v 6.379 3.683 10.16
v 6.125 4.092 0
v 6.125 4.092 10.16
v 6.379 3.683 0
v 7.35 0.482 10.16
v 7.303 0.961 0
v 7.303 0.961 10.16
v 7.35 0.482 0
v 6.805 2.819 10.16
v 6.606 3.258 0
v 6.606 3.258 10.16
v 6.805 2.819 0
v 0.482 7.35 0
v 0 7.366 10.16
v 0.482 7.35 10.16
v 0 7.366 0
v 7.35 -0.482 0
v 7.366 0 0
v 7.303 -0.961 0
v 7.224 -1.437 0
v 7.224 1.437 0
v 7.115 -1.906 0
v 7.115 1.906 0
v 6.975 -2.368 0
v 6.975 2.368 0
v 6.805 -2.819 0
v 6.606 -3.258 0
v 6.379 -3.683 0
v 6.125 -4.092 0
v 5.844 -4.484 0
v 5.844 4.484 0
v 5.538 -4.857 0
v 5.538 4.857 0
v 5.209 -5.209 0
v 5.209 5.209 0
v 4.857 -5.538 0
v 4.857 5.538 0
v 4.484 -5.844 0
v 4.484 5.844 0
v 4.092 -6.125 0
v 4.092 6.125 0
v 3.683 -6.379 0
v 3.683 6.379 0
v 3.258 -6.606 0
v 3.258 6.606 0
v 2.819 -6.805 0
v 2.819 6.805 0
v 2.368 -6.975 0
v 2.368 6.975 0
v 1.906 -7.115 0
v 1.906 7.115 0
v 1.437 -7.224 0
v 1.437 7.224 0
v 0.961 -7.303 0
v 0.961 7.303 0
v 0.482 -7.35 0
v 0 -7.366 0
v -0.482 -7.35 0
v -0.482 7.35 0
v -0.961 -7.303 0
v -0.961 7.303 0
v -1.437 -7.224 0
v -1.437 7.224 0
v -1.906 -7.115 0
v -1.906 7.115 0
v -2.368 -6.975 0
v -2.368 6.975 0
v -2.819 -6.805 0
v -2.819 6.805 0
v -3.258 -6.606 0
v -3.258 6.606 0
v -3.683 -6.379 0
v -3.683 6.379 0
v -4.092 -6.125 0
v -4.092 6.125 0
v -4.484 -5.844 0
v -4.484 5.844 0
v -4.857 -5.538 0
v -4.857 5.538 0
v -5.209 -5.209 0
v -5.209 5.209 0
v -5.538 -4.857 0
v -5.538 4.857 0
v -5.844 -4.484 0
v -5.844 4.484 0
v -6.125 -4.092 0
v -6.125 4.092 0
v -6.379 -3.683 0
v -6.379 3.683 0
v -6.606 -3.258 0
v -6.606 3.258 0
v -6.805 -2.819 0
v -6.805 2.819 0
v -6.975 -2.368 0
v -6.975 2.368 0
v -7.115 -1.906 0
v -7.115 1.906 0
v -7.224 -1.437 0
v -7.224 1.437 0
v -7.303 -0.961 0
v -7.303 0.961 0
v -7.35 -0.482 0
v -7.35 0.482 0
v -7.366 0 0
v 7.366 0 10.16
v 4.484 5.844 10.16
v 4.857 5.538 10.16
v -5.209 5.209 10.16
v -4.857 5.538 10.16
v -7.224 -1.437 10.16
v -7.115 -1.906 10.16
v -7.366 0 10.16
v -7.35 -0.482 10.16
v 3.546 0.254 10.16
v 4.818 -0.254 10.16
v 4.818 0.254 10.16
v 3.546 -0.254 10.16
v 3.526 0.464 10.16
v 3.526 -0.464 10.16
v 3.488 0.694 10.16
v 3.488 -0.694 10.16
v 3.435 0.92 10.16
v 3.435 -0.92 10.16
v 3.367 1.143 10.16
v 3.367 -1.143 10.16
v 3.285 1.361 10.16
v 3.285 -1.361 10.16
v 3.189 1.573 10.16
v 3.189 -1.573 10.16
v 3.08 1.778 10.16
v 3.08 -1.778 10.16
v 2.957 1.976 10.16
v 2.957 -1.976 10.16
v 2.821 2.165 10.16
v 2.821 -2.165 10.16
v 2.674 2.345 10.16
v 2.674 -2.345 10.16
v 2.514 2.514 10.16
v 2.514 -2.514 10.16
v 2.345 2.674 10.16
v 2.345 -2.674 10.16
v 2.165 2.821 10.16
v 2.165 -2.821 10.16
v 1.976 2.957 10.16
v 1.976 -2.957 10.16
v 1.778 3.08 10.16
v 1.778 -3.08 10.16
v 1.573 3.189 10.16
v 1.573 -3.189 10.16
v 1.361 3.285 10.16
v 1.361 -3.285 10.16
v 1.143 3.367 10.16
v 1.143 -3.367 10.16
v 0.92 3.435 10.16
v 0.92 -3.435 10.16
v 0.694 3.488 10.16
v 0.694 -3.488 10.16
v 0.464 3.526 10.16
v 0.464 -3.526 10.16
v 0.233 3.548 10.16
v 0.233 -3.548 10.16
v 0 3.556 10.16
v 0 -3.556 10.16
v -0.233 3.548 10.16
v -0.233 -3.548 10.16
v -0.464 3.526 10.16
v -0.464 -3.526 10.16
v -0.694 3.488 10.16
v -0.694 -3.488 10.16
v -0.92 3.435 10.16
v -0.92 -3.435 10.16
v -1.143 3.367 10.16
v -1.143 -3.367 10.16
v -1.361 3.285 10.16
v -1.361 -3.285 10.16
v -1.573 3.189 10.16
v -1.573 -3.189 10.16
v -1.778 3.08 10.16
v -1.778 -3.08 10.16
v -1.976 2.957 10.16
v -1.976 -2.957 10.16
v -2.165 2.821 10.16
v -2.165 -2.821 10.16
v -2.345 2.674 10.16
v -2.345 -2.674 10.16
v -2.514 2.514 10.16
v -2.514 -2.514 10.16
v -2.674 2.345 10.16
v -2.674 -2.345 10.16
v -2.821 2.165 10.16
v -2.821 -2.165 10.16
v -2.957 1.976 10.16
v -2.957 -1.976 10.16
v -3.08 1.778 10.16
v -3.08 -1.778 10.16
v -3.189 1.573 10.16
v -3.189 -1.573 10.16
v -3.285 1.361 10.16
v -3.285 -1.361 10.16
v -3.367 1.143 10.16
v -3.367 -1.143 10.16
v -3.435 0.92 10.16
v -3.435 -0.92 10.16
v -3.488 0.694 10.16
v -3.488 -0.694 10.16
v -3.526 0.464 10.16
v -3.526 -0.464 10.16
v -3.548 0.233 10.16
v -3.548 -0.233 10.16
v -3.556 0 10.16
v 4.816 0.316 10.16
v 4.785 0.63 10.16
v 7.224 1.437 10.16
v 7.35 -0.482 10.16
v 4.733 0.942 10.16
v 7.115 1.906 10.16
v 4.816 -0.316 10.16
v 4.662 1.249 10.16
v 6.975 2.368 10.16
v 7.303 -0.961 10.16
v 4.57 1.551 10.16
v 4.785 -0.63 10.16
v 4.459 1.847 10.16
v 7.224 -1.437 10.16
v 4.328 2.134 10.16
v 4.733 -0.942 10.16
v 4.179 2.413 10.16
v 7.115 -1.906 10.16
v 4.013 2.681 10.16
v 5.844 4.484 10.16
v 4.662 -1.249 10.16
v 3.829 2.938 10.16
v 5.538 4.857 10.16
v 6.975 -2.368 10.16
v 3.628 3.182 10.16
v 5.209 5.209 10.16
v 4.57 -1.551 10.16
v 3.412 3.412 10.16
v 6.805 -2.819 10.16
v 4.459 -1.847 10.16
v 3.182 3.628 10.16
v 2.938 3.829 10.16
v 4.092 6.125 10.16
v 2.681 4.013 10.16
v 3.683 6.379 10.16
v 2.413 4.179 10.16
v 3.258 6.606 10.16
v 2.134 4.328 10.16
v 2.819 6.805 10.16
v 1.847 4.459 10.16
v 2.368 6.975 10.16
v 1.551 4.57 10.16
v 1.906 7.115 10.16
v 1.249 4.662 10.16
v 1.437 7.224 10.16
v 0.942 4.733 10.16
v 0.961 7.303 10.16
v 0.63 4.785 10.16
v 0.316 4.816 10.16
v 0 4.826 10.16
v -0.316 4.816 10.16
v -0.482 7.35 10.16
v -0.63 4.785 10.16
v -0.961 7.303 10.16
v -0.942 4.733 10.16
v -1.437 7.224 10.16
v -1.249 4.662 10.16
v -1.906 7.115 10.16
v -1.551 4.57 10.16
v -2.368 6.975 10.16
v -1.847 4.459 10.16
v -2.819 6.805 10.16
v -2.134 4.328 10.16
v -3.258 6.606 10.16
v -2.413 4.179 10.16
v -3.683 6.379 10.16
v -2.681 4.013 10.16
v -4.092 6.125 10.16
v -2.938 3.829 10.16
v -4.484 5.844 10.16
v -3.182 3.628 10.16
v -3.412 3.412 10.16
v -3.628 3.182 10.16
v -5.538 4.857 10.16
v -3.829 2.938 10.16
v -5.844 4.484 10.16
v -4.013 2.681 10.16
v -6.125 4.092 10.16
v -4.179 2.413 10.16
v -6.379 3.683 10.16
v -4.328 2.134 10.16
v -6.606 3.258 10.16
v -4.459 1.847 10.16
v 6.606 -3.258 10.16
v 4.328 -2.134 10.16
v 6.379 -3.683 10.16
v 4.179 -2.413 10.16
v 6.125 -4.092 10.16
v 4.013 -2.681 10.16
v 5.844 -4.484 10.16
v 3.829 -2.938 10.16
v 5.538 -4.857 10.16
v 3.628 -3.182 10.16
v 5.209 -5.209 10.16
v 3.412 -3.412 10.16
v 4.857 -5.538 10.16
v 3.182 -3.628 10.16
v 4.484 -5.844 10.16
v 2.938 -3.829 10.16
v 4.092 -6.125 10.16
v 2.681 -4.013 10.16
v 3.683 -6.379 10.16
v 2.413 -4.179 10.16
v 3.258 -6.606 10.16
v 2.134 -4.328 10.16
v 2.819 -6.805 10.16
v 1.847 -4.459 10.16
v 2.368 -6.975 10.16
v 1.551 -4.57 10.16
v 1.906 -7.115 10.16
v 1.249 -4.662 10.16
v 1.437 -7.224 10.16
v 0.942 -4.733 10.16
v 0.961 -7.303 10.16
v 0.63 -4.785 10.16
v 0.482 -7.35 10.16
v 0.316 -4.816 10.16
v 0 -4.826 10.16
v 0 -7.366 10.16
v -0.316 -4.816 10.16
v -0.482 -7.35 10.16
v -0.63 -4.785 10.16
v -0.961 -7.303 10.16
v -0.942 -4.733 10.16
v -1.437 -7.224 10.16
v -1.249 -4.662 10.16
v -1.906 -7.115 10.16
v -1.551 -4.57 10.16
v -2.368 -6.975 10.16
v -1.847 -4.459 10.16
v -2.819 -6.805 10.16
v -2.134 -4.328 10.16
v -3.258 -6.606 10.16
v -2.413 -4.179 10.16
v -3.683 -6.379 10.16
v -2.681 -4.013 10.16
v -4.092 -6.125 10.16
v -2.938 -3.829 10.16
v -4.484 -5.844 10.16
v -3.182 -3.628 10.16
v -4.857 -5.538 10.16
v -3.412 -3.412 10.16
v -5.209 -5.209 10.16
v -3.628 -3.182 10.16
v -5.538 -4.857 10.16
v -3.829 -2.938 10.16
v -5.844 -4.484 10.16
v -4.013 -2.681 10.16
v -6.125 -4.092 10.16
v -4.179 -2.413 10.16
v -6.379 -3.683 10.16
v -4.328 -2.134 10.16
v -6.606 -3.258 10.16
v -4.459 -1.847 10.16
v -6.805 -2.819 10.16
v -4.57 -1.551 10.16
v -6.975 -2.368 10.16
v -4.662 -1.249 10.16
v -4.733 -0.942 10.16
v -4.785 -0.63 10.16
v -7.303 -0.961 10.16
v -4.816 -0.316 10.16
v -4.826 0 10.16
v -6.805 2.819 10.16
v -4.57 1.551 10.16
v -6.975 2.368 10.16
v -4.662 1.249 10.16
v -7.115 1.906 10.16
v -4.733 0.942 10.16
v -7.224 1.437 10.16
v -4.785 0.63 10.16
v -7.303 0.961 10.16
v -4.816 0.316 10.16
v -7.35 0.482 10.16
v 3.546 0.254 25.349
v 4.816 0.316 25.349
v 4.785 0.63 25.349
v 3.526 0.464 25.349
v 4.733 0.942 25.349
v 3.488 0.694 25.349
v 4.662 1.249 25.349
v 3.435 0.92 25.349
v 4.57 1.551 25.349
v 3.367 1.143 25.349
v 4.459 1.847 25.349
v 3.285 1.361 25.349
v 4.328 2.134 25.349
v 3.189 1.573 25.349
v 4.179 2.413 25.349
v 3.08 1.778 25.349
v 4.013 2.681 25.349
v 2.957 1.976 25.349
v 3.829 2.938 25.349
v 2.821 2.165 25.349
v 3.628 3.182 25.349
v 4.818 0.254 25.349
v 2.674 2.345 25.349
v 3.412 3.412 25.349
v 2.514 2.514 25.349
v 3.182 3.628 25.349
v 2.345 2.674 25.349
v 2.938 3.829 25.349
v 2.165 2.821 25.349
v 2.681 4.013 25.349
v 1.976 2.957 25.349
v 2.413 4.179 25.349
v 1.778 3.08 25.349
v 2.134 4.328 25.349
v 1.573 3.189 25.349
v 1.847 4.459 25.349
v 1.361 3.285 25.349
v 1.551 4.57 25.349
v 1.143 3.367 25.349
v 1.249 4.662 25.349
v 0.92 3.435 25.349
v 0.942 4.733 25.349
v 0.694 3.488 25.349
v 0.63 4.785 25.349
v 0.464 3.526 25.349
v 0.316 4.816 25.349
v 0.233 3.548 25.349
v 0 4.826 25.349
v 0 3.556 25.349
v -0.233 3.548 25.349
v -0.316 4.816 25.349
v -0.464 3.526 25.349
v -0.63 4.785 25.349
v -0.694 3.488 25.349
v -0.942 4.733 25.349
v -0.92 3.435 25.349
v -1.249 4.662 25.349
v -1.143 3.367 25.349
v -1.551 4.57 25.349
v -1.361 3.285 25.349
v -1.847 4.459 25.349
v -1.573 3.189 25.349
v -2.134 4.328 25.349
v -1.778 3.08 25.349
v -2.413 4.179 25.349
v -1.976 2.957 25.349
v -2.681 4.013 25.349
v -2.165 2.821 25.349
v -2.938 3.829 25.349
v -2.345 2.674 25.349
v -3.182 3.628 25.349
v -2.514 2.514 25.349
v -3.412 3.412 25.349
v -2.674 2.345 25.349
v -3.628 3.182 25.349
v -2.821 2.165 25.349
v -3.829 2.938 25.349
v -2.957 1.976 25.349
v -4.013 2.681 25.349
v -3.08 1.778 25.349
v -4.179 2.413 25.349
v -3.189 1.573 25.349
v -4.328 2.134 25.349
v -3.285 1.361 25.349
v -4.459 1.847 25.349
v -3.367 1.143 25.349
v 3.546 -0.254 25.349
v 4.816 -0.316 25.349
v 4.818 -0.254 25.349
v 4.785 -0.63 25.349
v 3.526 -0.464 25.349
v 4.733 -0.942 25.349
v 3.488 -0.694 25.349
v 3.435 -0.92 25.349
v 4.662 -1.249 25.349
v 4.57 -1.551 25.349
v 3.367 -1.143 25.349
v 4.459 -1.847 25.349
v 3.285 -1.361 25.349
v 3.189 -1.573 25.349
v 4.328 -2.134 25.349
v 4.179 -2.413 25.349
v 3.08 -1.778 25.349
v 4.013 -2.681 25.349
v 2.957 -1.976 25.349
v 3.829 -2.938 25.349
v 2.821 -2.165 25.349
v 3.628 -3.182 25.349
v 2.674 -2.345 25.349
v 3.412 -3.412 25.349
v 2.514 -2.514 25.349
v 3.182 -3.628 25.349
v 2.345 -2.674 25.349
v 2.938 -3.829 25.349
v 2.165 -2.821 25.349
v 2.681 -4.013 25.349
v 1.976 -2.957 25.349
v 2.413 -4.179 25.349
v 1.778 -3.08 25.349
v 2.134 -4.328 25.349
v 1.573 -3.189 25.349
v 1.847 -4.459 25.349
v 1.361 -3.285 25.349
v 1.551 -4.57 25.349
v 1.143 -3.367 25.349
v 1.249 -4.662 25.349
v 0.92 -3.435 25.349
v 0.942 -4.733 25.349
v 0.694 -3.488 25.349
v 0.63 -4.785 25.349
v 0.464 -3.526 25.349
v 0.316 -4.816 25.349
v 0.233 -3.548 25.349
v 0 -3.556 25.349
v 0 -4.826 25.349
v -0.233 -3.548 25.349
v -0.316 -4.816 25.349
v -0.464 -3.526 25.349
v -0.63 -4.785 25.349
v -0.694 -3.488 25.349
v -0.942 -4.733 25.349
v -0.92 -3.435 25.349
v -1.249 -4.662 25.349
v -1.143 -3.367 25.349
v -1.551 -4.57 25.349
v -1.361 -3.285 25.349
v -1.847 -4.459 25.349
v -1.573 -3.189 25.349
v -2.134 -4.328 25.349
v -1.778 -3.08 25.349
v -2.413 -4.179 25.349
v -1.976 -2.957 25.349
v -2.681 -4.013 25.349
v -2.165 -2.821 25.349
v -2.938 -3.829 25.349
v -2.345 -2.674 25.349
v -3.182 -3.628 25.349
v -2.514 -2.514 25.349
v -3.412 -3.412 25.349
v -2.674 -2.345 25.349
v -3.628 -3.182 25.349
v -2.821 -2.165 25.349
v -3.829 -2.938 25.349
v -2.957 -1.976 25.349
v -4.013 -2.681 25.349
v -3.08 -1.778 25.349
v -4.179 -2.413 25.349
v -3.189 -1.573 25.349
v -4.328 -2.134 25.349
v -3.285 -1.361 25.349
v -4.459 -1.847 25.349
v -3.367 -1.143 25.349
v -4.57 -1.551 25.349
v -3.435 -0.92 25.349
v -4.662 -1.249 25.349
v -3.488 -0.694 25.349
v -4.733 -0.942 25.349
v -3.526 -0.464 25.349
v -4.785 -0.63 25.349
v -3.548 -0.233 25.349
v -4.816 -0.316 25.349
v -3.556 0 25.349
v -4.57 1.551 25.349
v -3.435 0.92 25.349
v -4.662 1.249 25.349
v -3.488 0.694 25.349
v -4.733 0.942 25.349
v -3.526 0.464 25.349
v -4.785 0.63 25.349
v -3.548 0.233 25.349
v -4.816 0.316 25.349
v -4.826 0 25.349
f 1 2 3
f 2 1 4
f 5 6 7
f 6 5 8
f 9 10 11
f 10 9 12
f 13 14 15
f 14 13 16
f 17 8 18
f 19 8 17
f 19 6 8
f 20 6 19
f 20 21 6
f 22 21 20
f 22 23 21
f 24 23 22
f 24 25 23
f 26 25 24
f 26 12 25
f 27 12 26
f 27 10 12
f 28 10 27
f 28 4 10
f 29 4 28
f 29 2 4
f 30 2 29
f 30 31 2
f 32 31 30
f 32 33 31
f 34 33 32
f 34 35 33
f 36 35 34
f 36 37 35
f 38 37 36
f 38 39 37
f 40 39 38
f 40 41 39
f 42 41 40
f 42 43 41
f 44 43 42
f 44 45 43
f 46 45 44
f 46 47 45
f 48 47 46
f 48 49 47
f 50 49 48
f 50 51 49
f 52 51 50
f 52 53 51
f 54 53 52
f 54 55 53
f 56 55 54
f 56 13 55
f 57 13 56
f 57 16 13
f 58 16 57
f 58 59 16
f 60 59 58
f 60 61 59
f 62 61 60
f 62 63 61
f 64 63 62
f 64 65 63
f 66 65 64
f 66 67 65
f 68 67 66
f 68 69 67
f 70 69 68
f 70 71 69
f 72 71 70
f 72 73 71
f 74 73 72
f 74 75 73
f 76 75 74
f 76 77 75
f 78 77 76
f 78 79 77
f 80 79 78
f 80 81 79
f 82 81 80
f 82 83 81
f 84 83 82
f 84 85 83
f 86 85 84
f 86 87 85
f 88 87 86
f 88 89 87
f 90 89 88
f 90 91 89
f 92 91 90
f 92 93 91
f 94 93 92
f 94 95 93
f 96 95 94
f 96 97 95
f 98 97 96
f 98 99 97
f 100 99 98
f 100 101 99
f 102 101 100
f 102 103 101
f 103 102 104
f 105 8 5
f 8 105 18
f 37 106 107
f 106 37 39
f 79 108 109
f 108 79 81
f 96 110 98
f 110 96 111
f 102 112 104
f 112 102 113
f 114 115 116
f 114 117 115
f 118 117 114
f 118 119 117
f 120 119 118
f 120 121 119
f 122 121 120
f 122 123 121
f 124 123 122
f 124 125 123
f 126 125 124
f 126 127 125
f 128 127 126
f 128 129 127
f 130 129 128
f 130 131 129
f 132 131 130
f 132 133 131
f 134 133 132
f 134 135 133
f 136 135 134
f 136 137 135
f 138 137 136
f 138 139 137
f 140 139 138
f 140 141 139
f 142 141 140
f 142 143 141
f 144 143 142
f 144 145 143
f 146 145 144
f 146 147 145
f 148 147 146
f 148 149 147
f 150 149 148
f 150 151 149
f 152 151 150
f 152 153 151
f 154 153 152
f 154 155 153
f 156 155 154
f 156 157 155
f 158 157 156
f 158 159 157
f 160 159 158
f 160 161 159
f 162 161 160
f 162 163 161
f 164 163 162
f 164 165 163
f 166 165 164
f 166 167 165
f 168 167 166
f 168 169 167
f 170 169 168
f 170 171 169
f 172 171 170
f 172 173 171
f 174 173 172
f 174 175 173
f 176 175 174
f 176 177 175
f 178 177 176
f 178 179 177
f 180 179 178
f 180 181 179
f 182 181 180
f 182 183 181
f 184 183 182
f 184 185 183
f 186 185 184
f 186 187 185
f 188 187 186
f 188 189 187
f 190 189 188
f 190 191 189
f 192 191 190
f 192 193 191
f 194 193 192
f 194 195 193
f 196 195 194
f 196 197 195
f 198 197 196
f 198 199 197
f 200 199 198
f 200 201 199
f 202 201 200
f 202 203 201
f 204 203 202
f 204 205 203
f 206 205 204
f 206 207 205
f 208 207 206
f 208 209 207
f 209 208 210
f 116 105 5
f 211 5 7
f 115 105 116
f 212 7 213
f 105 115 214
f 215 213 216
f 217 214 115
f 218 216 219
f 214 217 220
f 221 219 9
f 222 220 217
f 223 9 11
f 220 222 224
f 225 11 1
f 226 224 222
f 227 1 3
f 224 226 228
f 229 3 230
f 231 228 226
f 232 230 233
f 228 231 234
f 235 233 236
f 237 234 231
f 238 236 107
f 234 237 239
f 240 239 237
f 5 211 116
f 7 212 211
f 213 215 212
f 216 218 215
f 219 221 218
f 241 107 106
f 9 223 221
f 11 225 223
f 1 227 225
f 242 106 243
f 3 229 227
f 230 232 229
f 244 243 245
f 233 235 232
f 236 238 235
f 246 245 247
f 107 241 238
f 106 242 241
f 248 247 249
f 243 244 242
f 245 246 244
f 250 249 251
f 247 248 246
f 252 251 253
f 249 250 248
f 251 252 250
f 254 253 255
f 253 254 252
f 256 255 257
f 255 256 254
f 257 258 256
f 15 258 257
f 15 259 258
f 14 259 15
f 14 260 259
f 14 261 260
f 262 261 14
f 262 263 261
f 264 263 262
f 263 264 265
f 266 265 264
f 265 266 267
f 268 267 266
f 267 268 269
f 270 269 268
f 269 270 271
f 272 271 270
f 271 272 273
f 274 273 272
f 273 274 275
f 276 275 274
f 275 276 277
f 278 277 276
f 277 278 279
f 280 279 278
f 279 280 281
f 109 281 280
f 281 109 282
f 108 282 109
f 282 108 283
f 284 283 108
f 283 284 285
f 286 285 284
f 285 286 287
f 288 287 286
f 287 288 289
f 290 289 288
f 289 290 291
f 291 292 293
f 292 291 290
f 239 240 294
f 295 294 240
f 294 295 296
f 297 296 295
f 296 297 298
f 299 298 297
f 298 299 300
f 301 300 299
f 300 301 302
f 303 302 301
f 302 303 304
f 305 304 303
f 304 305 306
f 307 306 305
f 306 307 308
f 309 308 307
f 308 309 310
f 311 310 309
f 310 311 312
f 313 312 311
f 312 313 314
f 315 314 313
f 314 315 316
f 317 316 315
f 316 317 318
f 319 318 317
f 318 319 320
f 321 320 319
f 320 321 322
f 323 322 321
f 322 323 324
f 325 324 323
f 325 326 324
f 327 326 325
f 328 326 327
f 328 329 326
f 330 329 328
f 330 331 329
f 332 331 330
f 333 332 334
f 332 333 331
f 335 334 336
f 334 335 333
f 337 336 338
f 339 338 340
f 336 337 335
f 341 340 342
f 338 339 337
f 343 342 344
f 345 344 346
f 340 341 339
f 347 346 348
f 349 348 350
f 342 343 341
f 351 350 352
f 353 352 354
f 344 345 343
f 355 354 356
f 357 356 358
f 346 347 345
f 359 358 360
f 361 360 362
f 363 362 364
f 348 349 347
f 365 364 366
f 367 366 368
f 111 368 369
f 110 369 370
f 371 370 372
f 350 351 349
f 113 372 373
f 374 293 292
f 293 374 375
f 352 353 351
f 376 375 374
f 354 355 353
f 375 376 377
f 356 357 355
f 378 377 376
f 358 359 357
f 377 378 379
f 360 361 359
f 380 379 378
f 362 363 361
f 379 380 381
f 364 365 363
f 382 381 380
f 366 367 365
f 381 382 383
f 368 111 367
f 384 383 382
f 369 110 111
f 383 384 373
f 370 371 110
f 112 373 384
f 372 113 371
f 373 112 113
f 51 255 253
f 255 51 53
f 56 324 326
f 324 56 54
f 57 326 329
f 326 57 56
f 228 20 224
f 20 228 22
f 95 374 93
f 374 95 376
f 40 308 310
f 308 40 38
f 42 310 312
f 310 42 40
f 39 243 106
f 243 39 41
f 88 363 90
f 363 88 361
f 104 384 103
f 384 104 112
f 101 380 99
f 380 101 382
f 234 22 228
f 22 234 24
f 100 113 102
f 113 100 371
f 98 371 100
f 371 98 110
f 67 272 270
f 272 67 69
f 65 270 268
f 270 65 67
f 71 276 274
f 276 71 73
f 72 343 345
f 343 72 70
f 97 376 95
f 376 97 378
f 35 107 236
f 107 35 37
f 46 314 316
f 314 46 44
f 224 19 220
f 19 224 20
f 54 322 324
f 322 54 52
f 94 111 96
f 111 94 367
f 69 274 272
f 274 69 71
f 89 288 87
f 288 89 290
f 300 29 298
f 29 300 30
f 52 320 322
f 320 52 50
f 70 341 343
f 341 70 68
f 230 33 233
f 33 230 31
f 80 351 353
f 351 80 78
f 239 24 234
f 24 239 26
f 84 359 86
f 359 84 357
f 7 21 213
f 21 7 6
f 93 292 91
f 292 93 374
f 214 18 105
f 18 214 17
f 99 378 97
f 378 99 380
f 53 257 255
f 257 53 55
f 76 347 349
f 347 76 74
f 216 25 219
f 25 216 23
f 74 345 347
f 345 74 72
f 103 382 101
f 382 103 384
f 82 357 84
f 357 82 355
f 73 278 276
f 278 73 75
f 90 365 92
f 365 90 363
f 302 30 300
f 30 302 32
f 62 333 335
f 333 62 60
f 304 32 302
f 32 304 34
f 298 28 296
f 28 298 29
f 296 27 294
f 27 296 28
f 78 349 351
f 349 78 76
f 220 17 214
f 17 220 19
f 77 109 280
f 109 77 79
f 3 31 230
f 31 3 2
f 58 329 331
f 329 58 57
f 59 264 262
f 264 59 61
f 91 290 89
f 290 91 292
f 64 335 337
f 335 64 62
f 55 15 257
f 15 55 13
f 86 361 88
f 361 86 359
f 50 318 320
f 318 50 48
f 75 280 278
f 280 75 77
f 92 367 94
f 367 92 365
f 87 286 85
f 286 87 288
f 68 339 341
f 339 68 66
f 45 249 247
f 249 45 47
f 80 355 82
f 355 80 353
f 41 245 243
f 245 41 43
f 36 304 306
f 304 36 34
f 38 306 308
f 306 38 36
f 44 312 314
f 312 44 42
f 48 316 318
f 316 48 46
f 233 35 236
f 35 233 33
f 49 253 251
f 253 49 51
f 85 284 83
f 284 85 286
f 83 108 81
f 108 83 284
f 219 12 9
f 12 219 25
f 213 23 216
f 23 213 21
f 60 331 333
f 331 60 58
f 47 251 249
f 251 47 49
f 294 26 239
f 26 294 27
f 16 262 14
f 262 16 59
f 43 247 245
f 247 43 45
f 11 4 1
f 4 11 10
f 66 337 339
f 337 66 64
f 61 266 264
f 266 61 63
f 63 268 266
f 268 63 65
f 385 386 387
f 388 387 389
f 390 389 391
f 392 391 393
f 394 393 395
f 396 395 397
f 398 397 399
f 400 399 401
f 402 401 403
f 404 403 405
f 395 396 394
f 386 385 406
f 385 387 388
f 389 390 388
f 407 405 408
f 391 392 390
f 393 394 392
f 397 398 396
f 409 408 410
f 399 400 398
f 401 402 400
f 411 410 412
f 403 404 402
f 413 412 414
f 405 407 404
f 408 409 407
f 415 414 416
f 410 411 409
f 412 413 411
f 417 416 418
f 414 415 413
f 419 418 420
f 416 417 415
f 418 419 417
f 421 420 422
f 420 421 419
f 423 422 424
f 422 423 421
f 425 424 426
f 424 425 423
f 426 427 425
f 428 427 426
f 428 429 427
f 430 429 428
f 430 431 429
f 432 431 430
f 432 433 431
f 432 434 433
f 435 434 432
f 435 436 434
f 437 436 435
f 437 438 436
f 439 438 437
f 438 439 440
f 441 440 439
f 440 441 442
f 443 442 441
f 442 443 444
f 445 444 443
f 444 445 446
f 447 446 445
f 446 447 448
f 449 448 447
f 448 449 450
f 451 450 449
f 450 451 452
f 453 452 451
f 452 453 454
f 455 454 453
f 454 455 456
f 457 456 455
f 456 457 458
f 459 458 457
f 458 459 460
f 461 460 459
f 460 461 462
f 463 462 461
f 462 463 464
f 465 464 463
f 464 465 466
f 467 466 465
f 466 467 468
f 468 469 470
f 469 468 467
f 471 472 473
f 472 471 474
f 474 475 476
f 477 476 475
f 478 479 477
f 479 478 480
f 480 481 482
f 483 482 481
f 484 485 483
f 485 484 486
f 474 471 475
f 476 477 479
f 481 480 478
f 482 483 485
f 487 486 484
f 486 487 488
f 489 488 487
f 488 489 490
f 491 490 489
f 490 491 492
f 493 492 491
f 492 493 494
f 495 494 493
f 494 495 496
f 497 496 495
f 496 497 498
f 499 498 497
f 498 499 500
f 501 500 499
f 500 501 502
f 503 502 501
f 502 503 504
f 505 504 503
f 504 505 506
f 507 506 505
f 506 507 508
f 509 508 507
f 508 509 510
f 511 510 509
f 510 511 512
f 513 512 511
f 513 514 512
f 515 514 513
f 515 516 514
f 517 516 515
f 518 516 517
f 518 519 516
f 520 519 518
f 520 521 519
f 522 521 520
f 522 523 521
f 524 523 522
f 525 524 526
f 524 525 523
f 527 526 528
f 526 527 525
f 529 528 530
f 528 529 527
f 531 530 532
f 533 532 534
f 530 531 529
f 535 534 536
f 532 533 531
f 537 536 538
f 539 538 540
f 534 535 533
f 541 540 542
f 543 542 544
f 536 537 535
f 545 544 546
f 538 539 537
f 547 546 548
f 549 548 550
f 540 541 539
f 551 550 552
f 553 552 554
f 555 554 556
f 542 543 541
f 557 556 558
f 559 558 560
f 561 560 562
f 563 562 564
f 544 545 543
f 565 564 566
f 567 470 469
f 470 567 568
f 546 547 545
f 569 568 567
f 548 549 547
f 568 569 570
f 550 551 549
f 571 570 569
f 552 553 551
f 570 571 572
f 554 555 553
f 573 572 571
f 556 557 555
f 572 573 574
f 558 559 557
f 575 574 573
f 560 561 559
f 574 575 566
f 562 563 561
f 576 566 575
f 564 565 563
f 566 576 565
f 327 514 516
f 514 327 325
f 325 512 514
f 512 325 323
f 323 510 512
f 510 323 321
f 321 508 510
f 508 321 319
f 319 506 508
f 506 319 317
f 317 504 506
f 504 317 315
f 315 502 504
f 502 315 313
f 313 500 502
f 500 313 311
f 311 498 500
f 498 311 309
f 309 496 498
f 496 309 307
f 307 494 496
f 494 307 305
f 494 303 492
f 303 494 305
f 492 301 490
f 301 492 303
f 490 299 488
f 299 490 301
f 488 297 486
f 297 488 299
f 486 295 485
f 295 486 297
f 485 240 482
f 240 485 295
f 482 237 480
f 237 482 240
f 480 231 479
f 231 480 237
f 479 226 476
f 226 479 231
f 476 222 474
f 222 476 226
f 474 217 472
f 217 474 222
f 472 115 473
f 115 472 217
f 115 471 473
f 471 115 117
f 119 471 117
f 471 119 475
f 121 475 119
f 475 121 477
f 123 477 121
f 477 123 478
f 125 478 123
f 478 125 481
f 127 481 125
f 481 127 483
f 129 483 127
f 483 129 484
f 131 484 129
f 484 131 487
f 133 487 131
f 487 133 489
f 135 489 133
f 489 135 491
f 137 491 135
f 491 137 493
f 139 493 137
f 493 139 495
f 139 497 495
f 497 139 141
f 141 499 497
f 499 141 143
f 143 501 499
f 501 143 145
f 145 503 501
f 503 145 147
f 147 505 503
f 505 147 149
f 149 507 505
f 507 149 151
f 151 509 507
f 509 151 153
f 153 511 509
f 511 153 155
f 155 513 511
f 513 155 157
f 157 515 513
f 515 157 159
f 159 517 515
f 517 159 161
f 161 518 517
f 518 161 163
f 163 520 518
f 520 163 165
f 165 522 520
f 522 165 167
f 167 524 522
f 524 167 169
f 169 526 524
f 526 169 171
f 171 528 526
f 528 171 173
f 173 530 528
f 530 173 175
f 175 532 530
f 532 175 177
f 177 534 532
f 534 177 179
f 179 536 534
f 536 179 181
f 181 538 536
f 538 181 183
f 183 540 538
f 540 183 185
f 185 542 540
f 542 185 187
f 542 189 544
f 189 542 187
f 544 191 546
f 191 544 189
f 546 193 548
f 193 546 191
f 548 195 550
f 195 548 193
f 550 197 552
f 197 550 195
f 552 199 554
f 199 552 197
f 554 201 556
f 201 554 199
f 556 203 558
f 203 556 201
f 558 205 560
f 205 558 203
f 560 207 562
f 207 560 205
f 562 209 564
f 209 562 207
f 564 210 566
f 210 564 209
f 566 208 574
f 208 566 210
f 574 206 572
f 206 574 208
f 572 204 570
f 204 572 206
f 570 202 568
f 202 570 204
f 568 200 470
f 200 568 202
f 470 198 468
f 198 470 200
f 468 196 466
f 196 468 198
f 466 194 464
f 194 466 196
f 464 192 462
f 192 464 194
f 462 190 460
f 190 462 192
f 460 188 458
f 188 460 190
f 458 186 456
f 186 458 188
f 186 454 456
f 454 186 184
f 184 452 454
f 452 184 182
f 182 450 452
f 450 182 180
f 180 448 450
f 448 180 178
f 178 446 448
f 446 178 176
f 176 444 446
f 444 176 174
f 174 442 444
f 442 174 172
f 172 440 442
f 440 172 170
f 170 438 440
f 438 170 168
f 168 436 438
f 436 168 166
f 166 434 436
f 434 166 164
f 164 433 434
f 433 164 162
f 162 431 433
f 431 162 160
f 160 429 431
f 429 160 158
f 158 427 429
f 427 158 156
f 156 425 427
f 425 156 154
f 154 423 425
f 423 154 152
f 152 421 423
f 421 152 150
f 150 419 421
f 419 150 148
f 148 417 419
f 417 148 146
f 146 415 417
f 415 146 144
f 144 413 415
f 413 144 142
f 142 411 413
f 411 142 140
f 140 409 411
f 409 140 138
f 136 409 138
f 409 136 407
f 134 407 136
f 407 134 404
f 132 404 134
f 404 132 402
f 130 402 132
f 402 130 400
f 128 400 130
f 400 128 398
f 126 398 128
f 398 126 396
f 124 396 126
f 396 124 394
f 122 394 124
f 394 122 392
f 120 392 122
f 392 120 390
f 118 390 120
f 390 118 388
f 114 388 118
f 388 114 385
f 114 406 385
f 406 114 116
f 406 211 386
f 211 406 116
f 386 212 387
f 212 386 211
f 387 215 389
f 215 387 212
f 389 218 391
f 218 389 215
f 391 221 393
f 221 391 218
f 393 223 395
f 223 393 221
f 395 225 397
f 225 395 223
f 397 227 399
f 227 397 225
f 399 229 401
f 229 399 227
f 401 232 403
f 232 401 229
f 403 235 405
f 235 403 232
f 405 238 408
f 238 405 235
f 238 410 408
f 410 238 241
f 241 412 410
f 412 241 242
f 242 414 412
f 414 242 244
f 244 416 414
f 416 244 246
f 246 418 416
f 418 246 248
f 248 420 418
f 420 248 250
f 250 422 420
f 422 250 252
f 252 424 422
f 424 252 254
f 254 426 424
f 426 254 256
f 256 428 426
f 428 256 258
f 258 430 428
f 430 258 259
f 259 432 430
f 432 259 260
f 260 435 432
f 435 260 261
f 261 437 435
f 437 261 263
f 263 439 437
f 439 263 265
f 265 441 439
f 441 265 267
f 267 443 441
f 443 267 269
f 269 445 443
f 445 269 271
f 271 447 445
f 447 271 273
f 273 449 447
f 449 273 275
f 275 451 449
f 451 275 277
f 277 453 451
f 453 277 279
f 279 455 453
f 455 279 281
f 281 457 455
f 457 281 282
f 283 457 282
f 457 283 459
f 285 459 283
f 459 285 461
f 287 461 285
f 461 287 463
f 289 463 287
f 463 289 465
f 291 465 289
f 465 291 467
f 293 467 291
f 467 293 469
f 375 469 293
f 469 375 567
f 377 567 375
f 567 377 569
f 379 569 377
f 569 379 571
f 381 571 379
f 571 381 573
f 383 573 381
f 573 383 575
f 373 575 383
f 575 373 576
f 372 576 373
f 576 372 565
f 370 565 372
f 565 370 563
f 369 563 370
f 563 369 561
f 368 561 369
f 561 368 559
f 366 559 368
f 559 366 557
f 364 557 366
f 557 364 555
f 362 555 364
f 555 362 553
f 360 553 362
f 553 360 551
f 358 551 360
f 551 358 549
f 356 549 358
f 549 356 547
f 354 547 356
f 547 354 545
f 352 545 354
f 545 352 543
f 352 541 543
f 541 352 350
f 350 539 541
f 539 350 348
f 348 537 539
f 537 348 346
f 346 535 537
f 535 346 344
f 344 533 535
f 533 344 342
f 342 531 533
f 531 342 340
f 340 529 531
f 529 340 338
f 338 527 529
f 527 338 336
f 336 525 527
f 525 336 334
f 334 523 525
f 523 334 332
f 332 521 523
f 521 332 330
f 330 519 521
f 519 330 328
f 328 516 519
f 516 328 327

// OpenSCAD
ViewScale = [0.0254, 0.0254, 0.0254];

module plug()
{
    linear_extrude(400)
    circle(580/2, $fn=96);
    translate([0, 0, 398])
    linear_extrude(600)
    difference() {
        circle(380/2, $fn=96);
        circle(280/2, $fn=96);
        translate([150, 0, 0])
        square([100, 20], center=true);
    }
}

module forViewing()
{
}

module forPrinting()
{
    plug();
}

scale(ViewScale)
{
    forPrinting();
}
